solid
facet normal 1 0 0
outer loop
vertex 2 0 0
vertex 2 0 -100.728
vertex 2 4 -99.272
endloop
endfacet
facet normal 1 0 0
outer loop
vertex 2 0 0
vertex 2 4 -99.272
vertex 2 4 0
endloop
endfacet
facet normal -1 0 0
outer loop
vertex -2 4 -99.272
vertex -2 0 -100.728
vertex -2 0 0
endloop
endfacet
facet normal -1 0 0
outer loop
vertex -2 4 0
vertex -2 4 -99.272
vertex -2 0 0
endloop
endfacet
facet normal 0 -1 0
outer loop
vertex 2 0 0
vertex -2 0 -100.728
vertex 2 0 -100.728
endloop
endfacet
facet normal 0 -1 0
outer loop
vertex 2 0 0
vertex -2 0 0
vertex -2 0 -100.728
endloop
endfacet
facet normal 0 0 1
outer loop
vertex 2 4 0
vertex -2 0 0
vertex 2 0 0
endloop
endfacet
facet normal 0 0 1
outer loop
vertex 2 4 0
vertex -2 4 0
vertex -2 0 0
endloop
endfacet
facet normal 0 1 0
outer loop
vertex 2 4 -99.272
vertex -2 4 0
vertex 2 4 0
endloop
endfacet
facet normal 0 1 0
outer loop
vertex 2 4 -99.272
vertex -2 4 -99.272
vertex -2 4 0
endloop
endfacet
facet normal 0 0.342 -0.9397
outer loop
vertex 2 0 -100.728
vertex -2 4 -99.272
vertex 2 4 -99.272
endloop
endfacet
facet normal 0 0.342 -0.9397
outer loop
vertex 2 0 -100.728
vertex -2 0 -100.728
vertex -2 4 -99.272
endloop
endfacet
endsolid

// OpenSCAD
module vertical2x2(length=100, wood_width = 4, roof_angle=20, slice=0,slice2=0, slice3=0) 
{
    half_w = wood_width/2;
    cut_depth = wood_width*tan(roof_angle);
    
    difference() 
    {
        color([0.9,0.6,0.3])
        translate([half_w,half_w,0])
        rotate([0,90,180])
        linear_extrude(wood_width) 
        polygon(points=[[0, half_w],
            [length+cut_depth/2,half_w],
            [length-cut_depth/2,-half_w],
            [0, -half_w], [0, half_w]]);
        
        if (slice > 0.001) {
            slice_d = sqrt(2) * slice*1.001;
            translate([-wood_width/2, 0, -0.5 *(length+cut_depth)+0.05])
            rotate([0,0,45])
            cube([slice_d, slice_d, length + cut_depth + 2.1], center=true); 
        }
        
        if (slice2 > 0.001) {
            slice_d2 = sqrt(2) * slice2*1.001;
            translate([wood_width/2, wood_width, -0.5 *(length+cut_depth)+0.05])
            rotate([0,0,45])
            cube([slice_d2, slice_d2, length + cut_depth + 2.1], center=true); 
        }

        if (slice3 > 0.001) {
            slice_d3 = sqrt(2) * slice3*1.001;
            translate([wood_width/2, 0, -0.5 *(length+cut_depth)+0.05])
            rotate([0,0,45])
            cube([slice_d3, slice_d3, length + cut_depth + 2.1], center=true); 
        }
    }
}

vertical2x2();
